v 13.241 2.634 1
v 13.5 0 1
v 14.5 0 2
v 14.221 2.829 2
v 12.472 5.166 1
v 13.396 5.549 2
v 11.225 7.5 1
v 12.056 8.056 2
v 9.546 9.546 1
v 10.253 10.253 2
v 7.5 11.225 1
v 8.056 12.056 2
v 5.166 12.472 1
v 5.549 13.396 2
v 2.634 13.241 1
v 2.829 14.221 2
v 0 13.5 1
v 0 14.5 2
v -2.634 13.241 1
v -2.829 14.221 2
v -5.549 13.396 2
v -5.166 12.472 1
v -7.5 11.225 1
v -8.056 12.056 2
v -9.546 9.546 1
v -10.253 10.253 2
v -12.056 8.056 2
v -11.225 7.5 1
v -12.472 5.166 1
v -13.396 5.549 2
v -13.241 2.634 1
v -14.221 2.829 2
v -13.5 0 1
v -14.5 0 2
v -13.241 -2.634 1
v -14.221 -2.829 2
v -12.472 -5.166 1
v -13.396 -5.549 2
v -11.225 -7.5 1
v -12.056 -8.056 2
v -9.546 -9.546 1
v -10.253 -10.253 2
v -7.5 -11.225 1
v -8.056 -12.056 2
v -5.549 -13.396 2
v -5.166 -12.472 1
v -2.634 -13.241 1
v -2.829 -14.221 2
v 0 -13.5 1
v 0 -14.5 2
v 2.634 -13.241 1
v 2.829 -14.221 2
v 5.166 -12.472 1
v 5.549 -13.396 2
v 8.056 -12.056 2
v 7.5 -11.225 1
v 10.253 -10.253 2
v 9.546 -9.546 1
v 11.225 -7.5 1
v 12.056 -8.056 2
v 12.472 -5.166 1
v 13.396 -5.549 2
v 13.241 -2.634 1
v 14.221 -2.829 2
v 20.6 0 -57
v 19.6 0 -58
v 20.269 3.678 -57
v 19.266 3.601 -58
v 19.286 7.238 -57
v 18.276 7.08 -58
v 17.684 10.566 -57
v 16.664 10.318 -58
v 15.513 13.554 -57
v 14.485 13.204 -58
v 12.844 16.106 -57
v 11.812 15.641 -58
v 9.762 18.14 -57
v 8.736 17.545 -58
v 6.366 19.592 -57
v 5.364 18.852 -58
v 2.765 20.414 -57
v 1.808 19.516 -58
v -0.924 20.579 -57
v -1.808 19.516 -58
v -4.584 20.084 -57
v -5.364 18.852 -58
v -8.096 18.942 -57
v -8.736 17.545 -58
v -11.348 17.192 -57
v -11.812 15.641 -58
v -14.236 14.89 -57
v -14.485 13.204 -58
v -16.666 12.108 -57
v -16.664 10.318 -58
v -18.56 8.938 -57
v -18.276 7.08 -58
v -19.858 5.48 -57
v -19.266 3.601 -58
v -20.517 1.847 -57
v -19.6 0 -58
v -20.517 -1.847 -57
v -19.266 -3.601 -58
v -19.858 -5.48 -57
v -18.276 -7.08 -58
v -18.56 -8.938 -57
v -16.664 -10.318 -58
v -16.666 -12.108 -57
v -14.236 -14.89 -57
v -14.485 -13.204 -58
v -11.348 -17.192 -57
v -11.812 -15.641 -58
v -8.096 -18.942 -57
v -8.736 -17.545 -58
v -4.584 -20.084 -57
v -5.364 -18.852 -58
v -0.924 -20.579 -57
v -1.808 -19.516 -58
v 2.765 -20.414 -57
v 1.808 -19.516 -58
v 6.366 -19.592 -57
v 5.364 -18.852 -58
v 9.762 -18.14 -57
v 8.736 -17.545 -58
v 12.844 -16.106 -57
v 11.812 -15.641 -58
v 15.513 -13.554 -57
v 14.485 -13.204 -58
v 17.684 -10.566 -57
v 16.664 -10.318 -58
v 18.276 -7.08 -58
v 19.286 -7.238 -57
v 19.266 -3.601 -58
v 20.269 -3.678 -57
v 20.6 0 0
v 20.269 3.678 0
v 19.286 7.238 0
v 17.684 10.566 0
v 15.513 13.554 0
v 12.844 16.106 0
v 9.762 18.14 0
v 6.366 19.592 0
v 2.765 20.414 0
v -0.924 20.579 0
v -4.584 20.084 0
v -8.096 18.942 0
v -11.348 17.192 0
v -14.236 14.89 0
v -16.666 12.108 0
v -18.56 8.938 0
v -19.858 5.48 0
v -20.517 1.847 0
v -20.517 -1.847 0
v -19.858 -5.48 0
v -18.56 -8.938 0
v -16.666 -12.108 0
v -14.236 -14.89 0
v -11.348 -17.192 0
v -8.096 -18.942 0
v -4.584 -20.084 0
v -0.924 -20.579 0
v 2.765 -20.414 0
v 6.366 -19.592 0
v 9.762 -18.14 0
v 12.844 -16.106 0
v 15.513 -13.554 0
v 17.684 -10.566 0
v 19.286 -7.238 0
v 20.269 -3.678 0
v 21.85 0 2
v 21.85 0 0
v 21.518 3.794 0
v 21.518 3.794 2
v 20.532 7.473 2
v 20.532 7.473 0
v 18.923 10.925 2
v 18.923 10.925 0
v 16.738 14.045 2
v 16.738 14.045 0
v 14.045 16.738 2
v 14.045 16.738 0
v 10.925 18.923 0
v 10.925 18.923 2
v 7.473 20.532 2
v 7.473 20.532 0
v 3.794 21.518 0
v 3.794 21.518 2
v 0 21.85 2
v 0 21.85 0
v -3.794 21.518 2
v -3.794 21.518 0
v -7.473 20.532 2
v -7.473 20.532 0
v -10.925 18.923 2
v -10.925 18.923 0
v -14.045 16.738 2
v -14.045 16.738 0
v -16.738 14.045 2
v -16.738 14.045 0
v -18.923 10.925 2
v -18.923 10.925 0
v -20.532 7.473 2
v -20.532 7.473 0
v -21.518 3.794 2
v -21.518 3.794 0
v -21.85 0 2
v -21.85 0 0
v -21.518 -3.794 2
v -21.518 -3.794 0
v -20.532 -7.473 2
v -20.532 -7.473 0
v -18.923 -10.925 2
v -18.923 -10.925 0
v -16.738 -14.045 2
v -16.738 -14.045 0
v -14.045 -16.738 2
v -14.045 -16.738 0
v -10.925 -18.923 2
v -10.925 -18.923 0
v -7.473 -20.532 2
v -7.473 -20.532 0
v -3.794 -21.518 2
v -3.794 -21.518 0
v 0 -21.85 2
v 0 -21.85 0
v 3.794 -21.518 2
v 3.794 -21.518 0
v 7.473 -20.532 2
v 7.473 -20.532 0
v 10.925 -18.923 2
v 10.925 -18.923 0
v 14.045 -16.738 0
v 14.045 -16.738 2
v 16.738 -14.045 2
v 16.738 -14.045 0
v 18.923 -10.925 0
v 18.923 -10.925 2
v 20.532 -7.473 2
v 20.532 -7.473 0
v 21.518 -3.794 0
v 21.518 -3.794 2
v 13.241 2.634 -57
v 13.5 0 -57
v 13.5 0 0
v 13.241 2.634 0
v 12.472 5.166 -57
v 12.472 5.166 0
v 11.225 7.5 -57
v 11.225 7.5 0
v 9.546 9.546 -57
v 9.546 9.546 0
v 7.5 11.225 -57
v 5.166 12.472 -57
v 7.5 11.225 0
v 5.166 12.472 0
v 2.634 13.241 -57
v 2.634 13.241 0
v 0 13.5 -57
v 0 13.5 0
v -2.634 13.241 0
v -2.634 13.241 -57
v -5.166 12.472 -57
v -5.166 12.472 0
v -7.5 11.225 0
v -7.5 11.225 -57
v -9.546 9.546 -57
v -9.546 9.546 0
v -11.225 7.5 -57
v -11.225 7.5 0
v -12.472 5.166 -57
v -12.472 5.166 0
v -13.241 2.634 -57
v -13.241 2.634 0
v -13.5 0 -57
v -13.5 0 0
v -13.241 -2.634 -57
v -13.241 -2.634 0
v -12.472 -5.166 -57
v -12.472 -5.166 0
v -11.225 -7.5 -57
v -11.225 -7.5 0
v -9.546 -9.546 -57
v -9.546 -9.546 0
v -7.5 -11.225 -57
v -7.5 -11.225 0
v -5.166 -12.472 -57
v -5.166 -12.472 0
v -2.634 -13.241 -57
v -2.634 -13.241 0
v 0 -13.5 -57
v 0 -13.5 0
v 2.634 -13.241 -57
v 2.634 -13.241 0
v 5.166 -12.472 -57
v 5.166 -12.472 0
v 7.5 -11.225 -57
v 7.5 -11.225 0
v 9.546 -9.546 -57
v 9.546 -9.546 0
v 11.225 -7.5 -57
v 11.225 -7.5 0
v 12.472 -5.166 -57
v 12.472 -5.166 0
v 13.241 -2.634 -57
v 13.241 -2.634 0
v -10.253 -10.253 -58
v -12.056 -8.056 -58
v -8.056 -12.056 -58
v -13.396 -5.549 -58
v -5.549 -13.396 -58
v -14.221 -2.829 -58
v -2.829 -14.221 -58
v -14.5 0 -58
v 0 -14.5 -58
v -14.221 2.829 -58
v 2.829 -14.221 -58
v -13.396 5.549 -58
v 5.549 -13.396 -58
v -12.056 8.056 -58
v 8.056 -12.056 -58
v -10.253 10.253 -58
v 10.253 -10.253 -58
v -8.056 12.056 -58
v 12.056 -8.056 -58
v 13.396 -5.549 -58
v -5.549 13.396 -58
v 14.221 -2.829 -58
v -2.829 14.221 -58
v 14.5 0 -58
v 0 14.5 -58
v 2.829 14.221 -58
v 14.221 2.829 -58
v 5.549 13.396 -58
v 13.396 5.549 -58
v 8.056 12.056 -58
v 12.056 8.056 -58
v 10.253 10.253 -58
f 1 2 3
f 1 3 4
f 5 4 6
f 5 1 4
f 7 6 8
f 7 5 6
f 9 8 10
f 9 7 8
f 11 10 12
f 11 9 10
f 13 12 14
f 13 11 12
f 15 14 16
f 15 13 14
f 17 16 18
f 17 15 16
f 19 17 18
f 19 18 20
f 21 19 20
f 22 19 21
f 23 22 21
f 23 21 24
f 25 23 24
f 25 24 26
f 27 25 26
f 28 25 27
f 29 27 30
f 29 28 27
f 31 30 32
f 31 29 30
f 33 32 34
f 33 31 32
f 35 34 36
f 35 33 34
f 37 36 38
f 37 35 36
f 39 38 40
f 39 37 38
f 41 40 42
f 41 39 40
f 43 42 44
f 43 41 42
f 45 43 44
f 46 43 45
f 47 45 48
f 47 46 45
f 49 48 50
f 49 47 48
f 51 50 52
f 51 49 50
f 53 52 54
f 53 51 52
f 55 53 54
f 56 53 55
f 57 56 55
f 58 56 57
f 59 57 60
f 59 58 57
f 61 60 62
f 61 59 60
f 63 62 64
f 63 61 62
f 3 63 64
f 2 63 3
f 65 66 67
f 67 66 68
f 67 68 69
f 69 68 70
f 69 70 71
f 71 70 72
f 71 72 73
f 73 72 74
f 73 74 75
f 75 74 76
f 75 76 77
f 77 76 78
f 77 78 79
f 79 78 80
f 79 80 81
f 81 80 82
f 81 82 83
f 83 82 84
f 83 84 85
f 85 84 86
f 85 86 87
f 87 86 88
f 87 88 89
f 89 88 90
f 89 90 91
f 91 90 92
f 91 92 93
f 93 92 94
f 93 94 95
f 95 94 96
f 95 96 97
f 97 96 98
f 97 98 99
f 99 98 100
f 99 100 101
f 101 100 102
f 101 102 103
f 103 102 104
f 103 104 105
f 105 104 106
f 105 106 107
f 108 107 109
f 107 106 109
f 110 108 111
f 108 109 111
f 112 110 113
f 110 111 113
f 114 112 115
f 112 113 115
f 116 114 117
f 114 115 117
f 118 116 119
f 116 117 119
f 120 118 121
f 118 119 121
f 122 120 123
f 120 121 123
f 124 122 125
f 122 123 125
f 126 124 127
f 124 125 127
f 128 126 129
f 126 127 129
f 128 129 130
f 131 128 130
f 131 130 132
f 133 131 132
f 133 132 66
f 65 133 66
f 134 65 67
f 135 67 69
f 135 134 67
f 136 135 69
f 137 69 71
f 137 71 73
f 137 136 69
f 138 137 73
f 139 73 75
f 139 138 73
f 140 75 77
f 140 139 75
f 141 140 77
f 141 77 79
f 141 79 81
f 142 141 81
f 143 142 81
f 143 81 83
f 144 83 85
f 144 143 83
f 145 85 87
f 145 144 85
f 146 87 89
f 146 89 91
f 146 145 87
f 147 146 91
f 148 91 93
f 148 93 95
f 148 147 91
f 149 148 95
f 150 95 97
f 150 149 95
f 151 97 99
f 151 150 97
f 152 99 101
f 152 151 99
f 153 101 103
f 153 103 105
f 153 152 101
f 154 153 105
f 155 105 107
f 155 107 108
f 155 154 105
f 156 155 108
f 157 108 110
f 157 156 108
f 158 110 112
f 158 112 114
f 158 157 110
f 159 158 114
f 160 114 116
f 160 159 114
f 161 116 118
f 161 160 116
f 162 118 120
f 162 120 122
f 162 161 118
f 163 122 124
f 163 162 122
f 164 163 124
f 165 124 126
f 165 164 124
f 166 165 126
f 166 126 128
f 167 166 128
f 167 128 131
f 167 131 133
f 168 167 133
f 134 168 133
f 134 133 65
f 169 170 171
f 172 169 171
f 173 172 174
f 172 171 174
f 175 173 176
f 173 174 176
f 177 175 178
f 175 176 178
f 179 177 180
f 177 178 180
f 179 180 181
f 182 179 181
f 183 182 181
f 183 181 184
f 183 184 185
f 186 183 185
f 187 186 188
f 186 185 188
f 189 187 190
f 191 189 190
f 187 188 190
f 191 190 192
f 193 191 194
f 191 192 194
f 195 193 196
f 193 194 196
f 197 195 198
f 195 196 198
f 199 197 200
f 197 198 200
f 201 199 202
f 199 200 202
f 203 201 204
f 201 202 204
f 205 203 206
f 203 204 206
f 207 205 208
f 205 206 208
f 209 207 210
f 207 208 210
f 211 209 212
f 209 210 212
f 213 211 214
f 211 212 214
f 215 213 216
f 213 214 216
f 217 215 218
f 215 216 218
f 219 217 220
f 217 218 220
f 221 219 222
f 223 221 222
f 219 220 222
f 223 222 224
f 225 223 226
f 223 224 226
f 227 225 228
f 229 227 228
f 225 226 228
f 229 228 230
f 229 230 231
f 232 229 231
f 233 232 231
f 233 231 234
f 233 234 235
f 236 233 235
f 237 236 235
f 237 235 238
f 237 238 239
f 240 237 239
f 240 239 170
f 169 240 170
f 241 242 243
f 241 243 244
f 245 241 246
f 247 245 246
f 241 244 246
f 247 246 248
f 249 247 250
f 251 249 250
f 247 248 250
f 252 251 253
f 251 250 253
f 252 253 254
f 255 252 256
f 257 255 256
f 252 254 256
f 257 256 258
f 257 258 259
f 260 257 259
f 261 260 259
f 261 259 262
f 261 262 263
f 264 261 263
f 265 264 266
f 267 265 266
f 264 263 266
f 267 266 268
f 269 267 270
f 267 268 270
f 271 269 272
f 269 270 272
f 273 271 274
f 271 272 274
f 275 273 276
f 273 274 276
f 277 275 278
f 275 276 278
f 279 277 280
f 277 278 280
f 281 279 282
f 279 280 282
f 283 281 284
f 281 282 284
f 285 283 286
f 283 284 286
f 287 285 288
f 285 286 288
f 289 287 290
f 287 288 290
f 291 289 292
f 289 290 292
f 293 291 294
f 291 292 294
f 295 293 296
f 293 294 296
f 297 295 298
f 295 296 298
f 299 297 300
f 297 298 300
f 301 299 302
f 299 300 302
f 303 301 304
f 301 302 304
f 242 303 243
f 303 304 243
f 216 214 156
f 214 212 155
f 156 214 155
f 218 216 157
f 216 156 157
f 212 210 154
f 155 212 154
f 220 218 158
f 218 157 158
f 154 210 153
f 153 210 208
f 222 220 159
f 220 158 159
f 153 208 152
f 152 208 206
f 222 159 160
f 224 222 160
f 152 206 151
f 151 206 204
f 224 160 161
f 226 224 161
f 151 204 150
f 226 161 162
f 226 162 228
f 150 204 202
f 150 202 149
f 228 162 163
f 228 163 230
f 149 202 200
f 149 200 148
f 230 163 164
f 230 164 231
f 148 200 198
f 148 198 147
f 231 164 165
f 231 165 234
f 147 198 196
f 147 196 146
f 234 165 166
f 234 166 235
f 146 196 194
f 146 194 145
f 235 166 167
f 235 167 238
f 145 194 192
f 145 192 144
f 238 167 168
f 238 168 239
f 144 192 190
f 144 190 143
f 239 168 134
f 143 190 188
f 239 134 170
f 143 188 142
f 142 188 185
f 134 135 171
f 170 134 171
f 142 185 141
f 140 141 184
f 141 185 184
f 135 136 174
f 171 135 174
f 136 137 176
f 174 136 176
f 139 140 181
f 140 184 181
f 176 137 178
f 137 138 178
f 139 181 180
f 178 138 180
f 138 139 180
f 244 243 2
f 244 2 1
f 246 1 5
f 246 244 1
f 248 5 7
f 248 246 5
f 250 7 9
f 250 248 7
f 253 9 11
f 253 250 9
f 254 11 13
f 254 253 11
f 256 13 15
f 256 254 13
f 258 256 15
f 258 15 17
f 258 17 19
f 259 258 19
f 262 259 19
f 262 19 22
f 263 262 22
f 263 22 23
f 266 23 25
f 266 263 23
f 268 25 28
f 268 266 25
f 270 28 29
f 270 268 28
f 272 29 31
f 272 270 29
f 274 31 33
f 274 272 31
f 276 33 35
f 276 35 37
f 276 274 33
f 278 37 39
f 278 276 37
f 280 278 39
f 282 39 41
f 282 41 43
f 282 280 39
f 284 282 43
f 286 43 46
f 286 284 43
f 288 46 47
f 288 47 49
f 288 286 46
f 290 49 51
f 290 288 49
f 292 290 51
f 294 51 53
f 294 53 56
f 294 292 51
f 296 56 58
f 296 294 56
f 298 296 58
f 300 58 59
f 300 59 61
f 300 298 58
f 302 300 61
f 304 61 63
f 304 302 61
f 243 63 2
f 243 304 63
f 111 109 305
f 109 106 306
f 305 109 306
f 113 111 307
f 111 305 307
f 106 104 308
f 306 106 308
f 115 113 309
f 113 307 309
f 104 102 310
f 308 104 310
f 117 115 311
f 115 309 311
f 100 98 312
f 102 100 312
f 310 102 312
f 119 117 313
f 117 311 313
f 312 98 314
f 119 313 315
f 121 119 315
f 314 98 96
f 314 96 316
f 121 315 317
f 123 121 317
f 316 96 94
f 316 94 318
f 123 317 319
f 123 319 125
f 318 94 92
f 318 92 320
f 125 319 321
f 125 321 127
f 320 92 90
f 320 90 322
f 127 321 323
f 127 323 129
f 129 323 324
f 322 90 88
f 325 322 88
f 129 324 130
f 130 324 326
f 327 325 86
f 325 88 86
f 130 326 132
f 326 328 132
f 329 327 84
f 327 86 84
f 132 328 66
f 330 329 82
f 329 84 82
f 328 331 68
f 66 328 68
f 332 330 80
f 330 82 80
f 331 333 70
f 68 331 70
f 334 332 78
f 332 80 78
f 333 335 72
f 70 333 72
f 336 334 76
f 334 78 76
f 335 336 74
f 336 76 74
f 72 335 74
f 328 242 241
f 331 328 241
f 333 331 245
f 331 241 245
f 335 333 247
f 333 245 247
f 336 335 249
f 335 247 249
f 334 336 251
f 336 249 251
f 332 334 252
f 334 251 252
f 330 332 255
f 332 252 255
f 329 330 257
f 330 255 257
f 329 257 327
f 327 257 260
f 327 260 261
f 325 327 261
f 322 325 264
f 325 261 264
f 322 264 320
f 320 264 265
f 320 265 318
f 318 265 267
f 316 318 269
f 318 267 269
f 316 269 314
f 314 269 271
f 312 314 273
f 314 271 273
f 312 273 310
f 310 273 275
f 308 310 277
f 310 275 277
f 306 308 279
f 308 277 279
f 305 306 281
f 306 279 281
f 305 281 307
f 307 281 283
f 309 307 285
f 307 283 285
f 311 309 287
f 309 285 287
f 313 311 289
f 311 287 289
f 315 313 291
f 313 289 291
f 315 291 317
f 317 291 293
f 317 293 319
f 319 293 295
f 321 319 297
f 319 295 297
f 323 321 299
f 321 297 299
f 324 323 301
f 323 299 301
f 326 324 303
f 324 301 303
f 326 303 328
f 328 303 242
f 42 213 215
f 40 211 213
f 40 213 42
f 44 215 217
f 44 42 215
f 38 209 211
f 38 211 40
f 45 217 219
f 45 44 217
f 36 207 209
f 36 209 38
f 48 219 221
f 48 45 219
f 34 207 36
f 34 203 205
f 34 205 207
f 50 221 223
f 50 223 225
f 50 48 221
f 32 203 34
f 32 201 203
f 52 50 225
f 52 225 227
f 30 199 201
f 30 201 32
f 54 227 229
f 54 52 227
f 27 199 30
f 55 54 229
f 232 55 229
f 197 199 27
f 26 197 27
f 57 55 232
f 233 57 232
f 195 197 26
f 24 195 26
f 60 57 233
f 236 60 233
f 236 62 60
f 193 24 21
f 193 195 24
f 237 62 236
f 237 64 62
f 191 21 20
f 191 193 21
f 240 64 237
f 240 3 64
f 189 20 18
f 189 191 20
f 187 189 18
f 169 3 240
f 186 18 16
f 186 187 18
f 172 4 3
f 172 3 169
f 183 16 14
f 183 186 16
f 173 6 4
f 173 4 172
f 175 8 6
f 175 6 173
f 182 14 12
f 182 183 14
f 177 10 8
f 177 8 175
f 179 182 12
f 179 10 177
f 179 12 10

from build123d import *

# Parameters (mm, degrees)
F0_R     = 21.85
F0_R_2   = 20.6
F0_R_3   = 15
F0_R_4   = 13.5
F1_DEPTH = 2
F2_DEPTH = 58
F3_SIZE  = 1


with BuildPart() as f1:
    # F0 (on Top) → F1 (new body)
    with BuildSketch(Plane.XY):
        Circle(F0_R)
        Circle(F0_R_2, mode=Mode.SUBTRACT)
        Circle(F0_R_2)
        Circle(F0_R_3, mode=Mode.SUBTRACT)
        Circle(F0_R_3)
        Circle(F0_R_4, mode=Mode.SUBTRACT)
    extrude(amount=F1_DEPTH)

    # F0 (on Top) → F2 (join)
    with BuildSketch(Plane.XY):
        Circle(F0_R_2)
        Circle(F0_R_3, mode=Mode.SUBTRACT)
        Circle(F0_R_3)
        Circle(F0_R_4, mode=Mode.SUBTRACT)
    extrude(amount=-F2_DEPTH)

    # F3
    f3_edges = [f1.edges().sort_by_distance(p)[0] for p in [
        (-20.6, 0, -58),
        (-13.5, 0, -58),
        (-13.5, 0, 2),
    ]]
    chamfer(f3_edges, length=F3_SIZE)


solid = f1.part
